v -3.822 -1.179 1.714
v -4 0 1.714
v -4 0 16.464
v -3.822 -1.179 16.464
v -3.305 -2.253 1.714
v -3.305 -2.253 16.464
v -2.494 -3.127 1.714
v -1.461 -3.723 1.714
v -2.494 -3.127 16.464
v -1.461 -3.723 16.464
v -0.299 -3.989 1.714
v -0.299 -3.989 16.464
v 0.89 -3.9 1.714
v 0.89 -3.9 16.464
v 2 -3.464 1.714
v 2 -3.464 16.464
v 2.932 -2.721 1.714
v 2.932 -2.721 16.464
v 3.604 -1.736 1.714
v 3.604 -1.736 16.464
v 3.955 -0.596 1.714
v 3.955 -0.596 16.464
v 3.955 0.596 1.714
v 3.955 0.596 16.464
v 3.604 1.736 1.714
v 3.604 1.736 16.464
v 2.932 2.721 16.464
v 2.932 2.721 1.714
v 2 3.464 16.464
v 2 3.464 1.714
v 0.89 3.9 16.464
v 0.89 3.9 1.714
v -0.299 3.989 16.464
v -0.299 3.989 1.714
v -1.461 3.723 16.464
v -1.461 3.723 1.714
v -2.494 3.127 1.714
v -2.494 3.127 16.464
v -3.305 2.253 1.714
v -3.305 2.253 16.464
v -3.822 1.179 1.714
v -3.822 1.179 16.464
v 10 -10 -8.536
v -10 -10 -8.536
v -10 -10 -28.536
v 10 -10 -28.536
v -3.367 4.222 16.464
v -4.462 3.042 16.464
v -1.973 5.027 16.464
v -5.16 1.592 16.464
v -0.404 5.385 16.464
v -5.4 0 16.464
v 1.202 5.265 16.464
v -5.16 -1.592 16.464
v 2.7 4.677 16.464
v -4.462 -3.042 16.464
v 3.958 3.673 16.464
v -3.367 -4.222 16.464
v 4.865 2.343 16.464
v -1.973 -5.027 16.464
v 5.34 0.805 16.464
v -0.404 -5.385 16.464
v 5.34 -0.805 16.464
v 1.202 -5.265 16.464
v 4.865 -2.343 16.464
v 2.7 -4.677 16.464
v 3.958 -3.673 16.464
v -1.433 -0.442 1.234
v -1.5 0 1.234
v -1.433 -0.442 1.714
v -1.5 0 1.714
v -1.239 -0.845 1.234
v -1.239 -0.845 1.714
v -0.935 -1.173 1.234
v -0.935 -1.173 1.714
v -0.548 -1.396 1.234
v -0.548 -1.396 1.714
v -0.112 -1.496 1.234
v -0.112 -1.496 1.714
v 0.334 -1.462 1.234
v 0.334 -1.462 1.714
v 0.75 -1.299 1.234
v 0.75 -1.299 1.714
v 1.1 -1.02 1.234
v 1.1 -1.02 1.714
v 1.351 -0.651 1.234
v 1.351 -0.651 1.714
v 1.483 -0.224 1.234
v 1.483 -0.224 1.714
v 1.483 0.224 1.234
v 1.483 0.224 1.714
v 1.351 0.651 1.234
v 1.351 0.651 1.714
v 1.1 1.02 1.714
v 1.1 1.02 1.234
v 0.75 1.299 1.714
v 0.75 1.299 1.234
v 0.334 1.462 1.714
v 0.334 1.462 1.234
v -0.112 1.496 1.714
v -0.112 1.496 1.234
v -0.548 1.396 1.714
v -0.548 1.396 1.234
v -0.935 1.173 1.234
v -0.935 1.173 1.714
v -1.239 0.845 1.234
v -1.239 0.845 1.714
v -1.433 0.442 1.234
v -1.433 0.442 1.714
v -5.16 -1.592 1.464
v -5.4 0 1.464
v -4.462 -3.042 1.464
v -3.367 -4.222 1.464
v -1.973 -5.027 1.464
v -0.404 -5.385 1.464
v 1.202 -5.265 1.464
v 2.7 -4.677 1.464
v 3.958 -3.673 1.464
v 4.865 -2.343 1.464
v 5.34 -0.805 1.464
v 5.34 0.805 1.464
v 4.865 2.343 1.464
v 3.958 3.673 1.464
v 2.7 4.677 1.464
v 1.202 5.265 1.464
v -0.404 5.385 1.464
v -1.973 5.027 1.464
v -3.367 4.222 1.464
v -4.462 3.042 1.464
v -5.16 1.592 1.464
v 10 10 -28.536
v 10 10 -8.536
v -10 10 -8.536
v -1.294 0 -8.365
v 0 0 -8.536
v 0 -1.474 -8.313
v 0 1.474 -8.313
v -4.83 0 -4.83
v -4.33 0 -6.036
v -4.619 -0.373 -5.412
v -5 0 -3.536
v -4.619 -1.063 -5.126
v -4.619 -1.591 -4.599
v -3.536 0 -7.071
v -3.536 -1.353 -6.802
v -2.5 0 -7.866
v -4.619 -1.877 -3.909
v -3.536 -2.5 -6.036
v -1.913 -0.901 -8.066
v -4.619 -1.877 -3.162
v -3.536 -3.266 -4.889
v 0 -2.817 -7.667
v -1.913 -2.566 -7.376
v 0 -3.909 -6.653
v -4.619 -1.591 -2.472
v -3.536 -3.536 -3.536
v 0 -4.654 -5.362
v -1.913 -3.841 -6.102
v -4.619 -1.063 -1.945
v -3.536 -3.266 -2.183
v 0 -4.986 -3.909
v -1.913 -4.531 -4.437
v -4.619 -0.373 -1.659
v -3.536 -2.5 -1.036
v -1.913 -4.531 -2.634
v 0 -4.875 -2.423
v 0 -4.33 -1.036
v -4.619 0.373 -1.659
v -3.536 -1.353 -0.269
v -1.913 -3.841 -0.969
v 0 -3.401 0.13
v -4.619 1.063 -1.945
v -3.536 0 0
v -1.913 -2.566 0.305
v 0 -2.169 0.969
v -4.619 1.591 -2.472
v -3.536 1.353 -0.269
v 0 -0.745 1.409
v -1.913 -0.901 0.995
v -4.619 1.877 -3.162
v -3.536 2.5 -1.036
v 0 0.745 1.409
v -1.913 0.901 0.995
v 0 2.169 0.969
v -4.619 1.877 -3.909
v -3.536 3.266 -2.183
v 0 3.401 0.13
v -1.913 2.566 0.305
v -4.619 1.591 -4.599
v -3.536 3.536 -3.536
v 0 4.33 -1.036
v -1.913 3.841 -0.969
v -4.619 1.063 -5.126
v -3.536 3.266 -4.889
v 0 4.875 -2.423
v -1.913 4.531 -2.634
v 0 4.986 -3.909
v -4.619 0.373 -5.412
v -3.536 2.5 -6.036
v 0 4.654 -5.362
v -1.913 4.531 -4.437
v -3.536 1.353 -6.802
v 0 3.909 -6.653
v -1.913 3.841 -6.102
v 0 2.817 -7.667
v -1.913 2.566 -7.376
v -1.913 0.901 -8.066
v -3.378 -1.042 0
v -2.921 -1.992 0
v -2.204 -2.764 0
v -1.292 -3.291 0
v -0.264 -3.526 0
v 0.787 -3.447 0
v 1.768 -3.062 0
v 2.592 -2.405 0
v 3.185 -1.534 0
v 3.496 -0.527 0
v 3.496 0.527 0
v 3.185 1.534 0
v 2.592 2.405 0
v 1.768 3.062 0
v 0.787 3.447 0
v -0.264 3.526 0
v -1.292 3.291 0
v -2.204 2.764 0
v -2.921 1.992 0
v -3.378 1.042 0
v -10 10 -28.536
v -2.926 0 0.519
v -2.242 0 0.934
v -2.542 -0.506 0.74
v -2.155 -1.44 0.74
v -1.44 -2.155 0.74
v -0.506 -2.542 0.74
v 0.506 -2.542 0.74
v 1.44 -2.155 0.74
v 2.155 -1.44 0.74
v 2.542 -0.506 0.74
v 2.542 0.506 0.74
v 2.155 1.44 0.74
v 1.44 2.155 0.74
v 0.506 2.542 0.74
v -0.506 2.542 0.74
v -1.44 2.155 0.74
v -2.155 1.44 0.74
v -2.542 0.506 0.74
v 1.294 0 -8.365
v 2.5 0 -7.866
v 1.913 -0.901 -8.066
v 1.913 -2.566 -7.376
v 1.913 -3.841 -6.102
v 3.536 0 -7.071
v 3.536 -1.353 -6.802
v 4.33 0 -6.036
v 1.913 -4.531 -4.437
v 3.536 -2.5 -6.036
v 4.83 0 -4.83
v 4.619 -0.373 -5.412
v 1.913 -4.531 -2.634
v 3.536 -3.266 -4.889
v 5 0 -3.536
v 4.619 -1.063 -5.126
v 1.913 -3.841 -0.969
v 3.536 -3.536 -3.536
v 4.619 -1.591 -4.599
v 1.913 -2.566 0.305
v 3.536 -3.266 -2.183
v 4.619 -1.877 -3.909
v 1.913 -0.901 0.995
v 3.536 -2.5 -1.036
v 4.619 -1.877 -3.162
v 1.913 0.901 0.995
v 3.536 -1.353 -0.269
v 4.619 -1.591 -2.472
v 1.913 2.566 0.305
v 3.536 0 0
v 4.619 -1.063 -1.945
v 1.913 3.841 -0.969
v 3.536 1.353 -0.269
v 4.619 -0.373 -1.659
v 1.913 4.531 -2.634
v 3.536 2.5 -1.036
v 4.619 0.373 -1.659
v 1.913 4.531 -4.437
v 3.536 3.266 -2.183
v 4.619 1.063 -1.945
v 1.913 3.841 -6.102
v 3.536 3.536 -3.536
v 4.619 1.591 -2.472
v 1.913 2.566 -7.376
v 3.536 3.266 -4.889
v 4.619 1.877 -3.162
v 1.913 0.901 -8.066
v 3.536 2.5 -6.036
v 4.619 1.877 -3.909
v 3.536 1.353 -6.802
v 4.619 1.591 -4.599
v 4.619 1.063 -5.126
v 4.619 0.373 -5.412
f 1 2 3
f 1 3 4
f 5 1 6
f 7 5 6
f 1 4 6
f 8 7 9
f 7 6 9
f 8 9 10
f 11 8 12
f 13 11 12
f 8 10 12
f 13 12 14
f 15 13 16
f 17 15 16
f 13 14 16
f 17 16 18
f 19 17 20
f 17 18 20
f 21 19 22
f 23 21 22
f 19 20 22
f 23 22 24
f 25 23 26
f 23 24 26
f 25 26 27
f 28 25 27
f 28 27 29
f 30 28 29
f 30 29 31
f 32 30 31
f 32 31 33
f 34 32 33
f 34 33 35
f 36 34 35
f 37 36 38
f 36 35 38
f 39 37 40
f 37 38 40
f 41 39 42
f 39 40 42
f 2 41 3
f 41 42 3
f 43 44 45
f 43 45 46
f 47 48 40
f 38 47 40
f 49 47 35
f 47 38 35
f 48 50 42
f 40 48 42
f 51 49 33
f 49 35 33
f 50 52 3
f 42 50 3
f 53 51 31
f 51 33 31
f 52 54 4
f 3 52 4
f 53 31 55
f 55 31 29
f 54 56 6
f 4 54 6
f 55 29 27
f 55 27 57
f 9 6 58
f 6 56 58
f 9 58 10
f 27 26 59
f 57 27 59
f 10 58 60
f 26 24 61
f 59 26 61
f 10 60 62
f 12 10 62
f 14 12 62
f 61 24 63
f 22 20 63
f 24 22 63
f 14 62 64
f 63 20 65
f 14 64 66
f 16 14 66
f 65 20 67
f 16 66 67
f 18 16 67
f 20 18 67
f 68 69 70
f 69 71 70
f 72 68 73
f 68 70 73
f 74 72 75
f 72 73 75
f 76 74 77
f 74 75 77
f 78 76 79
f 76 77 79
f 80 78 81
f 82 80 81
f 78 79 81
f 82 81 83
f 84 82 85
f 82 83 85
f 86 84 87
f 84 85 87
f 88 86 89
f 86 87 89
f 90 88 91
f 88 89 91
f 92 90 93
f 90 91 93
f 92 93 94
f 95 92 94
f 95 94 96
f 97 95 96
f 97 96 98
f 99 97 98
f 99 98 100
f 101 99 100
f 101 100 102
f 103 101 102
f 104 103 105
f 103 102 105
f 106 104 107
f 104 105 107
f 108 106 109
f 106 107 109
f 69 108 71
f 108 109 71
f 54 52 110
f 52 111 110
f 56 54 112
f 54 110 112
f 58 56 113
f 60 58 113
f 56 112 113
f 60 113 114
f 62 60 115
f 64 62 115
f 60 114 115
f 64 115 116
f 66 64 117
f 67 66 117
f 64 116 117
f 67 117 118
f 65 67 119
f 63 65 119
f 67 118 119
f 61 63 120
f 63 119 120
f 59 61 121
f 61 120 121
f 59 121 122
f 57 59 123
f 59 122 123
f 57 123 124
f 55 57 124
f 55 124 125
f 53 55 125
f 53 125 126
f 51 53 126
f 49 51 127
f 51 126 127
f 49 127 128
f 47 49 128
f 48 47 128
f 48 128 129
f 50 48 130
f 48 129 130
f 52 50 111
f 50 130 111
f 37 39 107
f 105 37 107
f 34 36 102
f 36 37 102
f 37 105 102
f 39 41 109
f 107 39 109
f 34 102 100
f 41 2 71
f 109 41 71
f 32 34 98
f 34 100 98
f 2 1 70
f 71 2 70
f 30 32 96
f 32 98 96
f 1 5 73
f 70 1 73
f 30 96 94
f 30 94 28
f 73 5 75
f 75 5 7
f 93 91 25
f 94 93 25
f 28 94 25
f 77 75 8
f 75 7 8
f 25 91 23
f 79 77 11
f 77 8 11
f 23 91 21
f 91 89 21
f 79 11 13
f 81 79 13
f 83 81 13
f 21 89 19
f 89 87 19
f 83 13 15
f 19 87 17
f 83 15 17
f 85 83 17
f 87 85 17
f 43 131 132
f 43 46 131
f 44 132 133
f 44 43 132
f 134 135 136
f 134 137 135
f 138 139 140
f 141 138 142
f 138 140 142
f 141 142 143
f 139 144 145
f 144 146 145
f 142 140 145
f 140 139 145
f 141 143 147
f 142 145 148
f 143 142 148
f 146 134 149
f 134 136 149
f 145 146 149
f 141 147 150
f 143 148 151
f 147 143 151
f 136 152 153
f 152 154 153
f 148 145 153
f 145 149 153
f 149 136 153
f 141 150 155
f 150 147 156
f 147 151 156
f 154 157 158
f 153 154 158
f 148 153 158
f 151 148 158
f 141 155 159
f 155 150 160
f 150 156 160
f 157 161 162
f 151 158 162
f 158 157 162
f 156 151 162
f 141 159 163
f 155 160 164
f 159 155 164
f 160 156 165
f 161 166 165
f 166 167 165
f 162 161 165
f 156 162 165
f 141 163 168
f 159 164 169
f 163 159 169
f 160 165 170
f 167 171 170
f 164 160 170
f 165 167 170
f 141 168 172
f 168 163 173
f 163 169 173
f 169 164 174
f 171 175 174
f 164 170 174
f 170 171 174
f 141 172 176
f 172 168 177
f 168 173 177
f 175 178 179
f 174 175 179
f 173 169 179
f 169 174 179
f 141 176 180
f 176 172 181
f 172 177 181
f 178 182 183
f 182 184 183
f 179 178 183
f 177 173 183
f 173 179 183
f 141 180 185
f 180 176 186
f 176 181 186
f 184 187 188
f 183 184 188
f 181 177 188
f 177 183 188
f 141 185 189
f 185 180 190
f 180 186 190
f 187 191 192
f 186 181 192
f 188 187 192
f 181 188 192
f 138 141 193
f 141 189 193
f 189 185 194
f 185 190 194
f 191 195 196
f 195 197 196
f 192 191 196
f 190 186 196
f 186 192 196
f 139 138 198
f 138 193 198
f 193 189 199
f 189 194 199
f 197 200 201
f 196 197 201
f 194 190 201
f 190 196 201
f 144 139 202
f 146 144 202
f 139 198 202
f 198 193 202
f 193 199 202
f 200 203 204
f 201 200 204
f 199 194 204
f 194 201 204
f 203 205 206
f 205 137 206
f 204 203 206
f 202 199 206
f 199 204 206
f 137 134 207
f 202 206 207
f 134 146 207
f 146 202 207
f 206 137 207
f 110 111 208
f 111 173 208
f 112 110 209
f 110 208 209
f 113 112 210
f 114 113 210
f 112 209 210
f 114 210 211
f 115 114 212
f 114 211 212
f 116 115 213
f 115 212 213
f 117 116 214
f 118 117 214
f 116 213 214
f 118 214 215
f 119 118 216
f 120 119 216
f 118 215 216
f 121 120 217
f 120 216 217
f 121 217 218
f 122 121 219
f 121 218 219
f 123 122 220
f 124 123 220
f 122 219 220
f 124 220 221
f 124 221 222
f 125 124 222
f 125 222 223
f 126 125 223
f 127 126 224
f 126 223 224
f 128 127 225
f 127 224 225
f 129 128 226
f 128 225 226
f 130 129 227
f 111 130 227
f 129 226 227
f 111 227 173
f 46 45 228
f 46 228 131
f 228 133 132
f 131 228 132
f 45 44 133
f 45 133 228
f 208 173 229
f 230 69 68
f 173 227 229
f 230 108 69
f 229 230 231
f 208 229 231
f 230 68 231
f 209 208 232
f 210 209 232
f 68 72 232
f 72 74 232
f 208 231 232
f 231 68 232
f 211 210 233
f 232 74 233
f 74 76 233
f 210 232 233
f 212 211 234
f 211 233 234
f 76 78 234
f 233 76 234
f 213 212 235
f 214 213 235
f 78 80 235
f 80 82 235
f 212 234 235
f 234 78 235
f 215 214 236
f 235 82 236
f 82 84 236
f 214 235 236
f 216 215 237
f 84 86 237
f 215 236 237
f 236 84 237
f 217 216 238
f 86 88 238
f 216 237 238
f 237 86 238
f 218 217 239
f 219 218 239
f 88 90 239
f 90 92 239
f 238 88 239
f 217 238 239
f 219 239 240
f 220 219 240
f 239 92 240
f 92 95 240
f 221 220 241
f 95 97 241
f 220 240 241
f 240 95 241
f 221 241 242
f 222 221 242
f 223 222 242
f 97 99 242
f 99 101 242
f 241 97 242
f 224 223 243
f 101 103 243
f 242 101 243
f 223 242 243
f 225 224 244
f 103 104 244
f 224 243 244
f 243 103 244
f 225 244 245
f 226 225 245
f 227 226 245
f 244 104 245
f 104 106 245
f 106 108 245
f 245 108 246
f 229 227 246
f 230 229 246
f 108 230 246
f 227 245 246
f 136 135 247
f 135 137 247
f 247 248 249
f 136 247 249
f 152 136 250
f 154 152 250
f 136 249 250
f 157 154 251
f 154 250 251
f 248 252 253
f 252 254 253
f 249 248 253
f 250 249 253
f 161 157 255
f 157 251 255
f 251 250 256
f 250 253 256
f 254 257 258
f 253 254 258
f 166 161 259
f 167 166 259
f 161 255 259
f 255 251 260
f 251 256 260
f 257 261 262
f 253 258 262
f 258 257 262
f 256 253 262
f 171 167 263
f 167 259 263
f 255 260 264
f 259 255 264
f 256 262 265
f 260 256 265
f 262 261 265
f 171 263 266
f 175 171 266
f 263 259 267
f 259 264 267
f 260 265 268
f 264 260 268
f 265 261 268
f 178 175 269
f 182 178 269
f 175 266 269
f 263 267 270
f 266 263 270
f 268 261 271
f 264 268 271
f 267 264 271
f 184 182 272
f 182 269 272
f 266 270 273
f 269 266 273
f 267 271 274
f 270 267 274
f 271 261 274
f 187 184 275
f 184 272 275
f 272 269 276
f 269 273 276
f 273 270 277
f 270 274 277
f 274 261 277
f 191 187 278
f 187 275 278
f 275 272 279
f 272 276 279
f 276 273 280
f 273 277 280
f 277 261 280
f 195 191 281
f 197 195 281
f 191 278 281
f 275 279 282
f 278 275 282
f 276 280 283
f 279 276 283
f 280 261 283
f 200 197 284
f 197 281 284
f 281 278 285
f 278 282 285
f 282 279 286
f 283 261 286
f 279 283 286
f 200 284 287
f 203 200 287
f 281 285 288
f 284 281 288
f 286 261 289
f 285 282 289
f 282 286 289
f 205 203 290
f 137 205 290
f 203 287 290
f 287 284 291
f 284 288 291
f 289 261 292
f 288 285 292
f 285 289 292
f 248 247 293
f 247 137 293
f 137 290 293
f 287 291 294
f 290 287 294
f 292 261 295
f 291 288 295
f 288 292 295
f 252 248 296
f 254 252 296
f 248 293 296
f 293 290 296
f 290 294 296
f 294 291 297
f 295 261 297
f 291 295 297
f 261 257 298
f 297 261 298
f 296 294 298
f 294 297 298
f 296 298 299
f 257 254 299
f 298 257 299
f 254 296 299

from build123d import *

# Parameters (mm, degrees)
F3_DEPTH = 10


with BuildPart() as f1:
    # F0 (on Front) → F1 (revolve)
    with BuildSketch(Plane.XZ):
        with BuildLine():
            Line((-1.5, 1.4644660941), (-3.5355339059, 1.4644660941))
            Line((-3.5355339059, 1.4644660941), (-3.5355339059, 0))
            ThreePointArc((-3.5355339059, 0), (-2.592284601, 0.7399848401), (-1.5, 1.2341621012))
            Line((-1.5, 1.2341621012), (-1.5, 1.4644660941))
        make_face()
        Polygon((-5.4, 16.4644660941), (-5.4, 1.4644660941), (-4, 1.4644660941), (-4, 1.7144660941), (-4, 16.4644660941), align=None)
        Polygon((-3.5355339059, 0), (-3.5355339059, 1.4644660941), (-1.5, 1.4644660941), (-1.5, 1.7144660941), (-4, 1.7144660941), (-4, 1.4644660941), (-5.4, 1.4644660941), align=None)
    revolve(axis=Axis((0, 0, 0.732233047), (0, 0, 1)))


with BuildPart() as f2:
    # F0 (on Front) → F2 (revolve)
    with BuildSketch(Plane.XZ):
        with BuildLine():
            Line((0, -3.5355339059), (-5, -3.5355339059))
            ThreePointArc((-5, -3.5355339059), (-3.5355339059, -7.0710678119), (0, -8.5355339059))
            ThreePointArc((0, -8.5355339059), (3.5355339059, -7.0710678119), (5, -3.5355339059))
            Line((5, -3.5355339059), (0, -3.5355339059))
        make_face()
    revolve(axis=Axis((-2.5, 0, -3.5355339059), (-1, 0, 0)))


with BuildPart() as f3:
    # F0 (on Front) → F3 (new body, symmetric)
    with BuildSketch(Plane.XZ):
        Polygon((10, -8.5355339059), (0, -8.5355339059), (-10, -8.5355339059), (-10, -28.5355339059), (10, -28.5355339059), align=None)
    extrude(amount=F3_DEPTH, both=True)


solid = Compound([f1.part, f2.part, f3.part])
